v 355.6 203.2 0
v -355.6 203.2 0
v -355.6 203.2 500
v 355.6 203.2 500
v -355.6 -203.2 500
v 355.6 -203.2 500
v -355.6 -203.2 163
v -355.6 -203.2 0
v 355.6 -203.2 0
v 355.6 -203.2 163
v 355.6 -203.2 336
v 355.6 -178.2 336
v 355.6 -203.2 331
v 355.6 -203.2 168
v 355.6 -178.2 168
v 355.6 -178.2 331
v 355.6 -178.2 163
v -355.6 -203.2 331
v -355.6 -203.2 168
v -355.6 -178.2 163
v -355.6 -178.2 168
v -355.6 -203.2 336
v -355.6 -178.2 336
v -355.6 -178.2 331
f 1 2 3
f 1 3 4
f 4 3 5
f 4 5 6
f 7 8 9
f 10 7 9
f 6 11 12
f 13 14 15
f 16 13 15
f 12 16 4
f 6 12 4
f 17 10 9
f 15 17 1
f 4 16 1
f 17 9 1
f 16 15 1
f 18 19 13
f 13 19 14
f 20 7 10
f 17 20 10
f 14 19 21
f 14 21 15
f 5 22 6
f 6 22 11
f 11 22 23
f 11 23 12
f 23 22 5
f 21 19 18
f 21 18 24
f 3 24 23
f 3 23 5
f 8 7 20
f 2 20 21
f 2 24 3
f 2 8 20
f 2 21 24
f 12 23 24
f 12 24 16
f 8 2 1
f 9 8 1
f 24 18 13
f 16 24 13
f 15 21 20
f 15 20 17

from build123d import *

# Parameters (mm, degrees)
F0_W     = 711.2
F0_H     = 406.4
F1_DEPTH = 500
F2_W     = 711.2
F2_H     = 5
F3_DEPTH = 25


with BuildPart() as f1:
    # F0 (on Top) → F1 (new body)
    with BuildSketch(Plane.XY):
        Rectangle(F0_W, F0_H)
    extrude(amount=F1_DEPTH)

    # F2 (on face) → F3 (cut)
    with BuildSketch(Plane.XZ.offset(203.2)):
        with Locations((0, 333.5)):
            Rectangle(F2_W, F2_H)
        with Locations((0, 165.5)):
            Rectangle(F2_W, F2_H)
    extrude(amount=-F3_DEPTH, mode=Mode.SUBTRACT)


solid = f1.part
